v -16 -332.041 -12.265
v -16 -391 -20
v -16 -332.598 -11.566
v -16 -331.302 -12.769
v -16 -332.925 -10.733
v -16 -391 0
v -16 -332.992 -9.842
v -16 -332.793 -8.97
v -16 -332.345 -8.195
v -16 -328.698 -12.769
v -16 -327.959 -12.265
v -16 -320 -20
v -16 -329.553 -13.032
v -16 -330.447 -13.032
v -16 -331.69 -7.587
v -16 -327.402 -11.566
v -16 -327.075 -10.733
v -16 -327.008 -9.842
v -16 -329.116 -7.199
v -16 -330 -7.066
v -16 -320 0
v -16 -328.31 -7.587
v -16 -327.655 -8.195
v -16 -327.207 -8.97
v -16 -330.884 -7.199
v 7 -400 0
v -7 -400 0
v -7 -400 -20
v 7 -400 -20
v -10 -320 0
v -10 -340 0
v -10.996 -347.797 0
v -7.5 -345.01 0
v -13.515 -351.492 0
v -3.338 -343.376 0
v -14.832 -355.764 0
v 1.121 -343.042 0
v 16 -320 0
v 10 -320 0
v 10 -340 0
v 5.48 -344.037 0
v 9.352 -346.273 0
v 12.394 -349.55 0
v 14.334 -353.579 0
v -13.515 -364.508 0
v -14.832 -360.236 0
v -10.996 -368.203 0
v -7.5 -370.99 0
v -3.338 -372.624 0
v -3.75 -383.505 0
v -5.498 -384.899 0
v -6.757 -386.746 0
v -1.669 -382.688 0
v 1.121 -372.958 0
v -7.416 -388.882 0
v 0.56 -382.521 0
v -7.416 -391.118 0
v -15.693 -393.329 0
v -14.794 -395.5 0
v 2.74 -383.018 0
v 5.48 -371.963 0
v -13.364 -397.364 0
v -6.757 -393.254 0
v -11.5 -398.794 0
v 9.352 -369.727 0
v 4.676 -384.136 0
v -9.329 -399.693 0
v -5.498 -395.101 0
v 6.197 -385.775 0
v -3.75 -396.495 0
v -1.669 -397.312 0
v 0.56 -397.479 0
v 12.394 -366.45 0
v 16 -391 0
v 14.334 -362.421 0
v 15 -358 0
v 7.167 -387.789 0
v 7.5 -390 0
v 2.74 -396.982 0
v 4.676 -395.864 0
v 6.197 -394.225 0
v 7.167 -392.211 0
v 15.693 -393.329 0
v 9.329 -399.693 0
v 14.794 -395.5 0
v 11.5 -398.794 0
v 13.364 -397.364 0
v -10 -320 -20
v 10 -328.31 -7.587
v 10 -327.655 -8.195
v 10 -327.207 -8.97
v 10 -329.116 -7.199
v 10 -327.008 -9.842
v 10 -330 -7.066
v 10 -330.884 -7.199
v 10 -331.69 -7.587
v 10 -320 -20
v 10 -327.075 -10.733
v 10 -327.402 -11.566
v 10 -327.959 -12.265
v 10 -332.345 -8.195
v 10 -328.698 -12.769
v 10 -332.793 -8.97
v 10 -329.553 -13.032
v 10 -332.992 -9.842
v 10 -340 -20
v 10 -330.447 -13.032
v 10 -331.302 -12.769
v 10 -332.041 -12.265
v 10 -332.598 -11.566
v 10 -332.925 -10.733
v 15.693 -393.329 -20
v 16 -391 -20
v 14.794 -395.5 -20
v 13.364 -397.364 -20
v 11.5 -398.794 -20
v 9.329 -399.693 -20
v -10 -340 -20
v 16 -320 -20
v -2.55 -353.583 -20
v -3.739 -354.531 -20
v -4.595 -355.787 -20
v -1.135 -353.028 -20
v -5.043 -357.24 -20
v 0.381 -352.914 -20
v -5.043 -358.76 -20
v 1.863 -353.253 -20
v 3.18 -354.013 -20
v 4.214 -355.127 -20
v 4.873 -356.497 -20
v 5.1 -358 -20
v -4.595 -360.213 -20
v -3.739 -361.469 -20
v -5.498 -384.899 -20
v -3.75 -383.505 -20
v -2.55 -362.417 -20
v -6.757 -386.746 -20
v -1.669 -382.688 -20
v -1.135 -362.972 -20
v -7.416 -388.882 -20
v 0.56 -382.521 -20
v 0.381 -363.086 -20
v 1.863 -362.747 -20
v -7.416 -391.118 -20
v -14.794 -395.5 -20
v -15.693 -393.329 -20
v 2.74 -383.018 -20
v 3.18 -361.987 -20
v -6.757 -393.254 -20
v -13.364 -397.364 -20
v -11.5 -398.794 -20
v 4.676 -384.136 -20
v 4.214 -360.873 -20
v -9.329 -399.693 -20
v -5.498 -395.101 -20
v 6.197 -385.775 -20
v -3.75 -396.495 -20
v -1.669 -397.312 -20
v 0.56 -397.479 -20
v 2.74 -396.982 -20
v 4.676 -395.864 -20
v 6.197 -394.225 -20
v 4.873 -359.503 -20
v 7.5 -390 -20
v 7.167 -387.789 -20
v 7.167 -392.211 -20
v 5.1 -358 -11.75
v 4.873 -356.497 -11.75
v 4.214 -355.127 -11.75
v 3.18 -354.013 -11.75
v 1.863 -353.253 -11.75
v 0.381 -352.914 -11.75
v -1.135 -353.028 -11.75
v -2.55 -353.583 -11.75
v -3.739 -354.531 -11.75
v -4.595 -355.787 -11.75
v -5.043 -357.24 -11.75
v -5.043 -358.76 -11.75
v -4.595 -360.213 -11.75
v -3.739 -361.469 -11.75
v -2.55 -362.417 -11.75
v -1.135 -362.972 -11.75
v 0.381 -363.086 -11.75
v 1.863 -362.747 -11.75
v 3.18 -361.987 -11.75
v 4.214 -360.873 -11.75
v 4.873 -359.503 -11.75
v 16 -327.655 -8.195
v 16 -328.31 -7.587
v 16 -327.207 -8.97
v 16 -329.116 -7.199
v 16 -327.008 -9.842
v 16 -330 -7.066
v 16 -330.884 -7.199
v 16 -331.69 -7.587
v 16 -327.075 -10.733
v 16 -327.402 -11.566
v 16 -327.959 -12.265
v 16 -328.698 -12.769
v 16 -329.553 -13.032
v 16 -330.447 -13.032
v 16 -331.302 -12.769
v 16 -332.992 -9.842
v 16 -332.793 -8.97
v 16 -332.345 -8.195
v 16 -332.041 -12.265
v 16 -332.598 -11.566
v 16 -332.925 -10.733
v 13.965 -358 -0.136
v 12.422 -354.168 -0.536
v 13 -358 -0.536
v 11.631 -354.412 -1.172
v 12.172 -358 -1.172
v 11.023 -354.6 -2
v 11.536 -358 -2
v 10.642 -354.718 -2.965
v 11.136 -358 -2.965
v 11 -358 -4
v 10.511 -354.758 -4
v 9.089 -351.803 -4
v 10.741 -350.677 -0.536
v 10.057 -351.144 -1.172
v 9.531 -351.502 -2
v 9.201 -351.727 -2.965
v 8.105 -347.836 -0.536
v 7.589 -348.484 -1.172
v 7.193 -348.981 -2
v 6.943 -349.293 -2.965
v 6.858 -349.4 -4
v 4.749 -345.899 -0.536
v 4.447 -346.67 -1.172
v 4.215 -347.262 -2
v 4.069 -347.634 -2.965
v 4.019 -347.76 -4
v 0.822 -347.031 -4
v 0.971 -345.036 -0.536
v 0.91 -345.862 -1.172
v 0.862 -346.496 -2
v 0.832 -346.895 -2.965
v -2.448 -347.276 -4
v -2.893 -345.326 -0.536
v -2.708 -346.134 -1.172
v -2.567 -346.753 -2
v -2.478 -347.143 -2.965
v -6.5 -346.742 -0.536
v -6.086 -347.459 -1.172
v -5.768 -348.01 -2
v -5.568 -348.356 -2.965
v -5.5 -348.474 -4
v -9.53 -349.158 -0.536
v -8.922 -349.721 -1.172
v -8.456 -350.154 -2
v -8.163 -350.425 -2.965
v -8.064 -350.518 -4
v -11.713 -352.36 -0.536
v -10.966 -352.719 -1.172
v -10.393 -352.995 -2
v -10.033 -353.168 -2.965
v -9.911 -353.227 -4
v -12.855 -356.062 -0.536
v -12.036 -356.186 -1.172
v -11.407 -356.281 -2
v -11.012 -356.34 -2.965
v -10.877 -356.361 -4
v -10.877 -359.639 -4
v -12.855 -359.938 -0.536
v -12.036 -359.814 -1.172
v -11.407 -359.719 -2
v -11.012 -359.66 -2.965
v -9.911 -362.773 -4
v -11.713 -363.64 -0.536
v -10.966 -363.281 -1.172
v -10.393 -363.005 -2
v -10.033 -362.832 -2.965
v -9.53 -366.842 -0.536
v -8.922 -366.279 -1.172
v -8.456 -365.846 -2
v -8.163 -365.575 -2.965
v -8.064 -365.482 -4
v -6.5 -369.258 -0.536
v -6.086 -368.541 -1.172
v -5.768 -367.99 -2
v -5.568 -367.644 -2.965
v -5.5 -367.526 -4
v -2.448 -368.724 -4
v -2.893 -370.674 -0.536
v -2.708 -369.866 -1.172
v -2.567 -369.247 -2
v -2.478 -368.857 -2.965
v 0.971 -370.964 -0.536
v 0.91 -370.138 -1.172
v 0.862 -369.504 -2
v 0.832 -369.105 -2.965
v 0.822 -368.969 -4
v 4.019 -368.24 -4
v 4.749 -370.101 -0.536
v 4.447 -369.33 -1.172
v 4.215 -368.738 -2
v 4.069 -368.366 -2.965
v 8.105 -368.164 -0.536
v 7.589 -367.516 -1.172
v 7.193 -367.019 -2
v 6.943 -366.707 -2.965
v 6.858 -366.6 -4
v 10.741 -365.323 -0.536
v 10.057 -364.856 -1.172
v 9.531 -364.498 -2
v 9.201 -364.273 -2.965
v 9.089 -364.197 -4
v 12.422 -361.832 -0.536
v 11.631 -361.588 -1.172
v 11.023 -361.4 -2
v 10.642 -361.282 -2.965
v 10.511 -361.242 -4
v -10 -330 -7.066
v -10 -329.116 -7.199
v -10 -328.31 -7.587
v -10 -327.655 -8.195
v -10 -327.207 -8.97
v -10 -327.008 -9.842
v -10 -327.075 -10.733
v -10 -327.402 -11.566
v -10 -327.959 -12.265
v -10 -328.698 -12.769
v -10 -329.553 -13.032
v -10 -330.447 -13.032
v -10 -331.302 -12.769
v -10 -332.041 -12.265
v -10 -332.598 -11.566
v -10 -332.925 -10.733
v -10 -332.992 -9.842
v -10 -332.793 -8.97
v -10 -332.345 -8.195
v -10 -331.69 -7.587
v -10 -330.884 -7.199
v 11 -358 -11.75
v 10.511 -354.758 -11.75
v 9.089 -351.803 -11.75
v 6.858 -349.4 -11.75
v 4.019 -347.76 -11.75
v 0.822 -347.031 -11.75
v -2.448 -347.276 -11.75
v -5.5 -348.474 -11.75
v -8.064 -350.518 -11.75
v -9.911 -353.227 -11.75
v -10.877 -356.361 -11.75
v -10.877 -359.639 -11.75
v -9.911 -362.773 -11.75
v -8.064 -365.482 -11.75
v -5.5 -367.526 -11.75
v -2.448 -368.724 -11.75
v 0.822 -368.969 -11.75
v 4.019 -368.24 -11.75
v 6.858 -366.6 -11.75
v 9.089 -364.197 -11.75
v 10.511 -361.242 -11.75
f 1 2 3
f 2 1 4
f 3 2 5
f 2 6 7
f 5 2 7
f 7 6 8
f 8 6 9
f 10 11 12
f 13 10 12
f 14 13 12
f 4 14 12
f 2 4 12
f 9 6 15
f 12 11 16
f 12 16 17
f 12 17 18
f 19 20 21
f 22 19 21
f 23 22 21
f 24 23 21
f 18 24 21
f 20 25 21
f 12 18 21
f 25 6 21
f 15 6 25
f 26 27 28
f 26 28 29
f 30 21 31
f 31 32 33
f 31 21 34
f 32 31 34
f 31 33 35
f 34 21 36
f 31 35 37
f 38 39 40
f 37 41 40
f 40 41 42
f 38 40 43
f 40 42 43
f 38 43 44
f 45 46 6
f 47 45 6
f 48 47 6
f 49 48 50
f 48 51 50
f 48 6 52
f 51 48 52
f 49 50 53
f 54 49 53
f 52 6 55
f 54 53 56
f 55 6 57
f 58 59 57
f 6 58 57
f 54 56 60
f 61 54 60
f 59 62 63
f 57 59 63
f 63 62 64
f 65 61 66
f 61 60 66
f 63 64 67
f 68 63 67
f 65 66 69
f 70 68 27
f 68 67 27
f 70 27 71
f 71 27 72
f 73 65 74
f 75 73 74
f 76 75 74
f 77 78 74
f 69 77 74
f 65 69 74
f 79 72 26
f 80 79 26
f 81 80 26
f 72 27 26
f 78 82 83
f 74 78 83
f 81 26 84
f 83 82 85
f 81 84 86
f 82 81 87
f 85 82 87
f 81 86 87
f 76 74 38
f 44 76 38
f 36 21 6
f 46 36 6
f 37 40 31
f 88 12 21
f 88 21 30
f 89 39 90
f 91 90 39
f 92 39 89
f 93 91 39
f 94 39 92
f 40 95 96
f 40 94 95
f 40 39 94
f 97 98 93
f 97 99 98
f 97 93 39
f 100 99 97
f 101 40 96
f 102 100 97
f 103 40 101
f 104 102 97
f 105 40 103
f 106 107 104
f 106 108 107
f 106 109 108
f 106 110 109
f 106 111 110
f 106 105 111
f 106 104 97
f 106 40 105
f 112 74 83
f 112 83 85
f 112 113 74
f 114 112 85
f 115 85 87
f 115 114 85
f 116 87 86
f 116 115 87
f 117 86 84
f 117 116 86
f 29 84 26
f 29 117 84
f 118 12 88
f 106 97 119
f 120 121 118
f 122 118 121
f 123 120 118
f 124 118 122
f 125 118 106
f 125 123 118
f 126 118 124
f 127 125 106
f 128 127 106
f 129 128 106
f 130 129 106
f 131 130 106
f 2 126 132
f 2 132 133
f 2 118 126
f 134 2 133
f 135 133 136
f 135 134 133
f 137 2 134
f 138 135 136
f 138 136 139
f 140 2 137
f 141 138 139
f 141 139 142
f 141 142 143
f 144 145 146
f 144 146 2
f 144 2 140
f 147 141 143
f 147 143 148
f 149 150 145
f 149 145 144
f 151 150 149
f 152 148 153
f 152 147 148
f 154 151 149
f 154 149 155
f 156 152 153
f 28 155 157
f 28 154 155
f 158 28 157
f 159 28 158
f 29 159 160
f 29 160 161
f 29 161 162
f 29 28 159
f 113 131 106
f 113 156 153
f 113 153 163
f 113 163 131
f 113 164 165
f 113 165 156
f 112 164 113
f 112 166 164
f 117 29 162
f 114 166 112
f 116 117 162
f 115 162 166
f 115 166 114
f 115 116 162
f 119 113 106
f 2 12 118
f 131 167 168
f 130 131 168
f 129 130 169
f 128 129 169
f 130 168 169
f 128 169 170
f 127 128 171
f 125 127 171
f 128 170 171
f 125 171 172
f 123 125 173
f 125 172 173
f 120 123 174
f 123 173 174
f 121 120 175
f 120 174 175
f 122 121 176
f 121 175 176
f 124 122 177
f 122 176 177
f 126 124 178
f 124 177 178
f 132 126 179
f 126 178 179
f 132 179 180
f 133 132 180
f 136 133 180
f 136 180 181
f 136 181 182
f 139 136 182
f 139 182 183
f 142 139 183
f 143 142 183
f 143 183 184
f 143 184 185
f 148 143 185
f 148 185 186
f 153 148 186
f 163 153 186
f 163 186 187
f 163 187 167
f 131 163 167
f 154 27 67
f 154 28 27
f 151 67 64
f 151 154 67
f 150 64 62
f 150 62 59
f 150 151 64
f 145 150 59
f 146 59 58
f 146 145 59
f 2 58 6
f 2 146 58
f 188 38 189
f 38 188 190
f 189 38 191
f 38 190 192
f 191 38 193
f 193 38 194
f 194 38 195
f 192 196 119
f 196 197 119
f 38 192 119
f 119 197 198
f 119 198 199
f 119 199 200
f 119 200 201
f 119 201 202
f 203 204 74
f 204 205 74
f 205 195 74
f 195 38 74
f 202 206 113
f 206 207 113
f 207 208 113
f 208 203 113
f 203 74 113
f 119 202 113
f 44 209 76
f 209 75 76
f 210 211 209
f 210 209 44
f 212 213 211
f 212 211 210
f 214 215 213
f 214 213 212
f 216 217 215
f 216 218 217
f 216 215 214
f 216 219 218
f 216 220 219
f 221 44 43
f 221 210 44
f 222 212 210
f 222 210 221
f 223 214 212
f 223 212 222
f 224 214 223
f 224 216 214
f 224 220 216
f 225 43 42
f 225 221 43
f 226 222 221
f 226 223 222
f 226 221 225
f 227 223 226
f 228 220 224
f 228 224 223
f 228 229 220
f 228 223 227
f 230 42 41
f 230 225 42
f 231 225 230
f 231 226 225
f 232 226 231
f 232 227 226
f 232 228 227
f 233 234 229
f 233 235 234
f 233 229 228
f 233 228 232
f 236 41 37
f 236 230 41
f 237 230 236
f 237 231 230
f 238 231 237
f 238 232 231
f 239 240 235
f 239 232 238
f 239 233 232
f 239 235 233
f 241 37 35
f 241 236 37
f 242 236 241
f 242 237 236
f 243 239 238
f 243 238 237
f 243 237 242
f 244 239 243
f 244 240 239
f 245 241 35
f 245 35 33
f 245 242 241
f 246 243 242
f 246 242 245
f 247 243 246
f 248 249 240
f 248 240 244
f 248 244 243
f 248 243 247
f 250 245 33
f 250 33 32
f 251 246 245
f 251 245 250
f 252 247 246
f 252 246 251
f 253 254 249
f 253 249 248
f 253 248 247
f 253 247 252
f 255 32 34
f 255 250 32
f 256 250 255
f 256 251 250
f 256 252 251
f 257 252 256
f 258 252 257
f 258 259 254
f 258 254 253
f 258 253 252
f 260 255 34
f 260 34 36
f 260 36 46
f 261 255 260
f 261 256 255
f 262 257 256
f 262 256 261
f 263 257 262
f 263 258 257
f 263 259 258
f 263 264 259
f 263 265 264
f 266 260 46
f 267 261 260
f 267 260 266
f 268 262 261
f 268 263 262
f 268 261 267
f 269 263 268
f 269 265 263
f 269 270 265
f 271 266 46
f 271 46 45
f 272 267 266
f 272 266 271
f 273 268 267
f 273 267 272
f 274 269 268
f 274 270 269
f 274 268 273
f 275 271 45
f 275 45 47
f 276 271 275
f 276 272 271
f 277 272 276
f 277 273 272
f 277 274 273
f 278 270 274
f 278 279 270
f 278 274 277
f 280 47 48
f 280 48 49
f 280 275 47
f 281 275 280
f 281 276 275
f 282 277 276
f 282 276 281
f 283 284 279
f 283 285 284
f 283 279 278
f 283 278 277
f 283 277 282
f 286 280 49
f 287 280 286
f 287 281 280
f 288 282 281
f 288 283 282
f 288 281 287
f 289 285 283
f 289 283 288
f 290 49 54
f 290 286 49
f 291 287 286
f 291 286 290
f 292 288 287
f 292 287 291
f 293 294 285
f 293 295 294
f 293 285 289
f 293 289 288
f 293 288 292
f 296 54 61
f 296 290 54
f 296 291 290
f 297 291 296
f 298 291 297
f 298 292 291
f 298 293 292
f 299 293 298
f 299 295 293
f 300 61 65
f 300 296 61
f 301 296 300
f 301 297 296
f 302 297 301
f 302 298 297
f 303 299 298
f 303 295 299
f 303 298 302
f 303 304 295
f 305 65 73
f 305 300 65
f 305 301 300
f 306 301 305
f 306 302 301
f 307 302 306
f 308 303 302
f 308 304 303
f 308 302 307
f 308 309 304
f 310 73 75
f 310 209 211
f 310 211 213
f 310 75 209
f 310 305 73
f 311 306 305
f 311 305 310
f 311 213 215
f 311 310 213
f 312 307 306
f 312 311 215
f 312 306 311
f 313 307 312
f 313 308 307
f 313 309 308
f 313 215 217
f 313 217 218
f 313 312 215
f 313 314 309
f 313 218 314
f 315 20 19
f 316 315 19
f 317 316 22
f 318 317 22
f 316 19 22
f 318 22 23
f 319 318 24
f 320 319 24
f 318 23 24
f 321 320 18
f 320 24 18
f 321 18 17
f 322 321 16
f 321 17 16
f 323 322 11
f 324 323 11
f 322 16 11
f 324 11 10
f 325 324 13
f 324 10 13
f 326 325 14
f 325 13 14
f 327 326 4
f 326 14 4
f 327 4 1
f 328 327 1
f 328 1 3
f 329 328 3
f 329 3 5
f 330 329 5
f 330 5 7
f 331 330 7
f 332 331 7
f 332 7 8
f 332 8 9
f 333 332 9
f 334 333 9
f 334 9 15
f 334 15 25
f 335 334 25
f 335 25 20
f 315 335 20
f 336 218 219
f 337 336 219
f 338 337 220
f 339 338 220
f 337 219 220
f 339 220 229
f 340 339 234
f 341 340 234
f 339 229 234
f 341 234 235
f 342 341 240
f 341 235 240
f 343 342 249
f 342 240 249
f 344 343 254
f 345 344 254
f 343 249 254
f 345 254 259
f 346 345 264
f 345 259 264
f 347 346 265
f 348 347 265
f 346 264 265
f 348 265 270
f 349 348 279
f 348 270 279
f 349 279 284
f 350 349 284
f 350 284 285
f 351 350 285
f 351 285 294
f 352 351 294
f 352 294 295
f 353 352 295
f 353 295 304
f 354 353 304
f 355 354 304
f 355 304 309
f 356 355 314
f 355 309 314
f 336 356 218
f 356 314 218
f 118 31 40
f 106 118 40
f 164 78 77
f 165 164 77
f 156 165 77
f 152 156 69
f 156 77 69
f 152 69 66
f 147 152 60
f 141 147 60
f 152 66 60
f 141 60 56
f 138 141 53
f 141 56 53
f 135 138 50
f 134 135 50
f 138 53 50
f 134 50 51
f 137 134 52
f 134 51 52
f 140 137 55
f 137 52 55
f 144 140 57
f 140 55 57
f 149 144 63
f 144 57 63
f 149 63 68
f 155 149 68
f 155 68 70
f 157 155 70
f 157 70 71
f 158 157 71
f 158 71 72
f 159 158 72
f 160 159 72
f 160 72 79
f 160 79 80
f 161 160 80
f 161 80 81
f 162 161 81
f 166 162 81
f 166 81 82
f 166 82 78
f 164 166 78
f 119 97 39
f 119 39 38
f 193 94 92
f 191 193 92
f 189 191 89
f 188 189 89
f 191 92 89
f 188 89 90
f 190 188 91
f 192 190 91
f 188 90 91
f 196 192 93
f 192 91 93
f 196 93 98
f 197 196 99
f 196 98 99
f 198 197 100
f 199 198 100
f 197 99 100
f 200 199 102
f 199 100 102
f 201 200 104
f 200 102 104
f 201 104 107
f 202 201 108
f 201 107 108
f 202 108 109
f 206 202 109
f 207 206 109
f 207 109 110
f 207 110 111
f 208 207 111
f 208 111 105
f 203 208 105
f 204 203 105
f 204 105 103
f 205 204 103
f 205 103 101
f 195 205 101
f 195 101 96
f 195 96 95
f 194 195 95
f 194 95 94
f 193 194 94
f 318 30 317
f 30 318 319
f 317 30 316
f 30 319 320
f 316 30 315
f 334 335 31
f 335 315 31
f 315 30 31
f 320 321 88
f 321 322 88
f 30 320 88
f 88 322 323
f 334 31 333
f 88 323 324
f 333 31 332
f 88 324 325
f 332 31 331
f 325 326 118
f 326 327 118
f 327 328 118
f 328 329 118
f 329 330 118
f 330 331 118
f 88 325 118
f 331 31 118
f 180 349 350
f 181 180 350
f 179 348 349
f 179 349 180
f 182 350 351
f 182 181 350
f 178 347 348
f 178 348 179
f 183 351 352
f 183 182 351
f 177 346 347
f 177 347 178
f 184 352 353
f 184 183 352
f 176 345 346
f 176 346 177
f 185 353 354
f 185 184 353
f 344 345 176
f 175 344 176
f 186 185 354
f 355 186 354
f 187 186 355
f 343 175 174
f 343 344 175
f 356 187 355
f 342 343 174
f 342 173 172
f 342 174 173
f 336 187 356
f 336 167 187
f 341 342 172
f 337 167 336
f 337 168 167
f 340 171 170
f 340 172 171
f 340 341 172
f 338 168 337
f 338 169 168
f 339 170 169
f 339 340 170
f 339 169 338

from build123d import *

# Parameters (mm, degrees)
SKETCH1_W           = 32
SKETCH1_H           = 60
BOSS_EXTRUDE1_DEPTH = 20
SKETCH2_R           = 7.5
SKETCH2_R_2         = 5.1
CUT_EXTRUDE1_DEPTH  = 401.819161219
SKETCH3_R           = 11
CUT_EXTRUDE2_DEPTH  = 11.75
SKETCH4_W           = 6
SKETCH4_H           = 20
BOSS_EXTRUDE2_DEPTH = 20
SKETCH5_R           = 3
CUT_EXTRUDE3_DEPTH  = 402.776057027
FILLET2_R           = 9
FILLET3_R           = 4


with BuildPart() as part:
    # Sketch1 → Boss-Extrude1 (new body)
    with BuildSketch(Plane.XY):
        with Locations((0, -370)):
            Rectangle(SKETCH1_W, SKETCH1_H)
    extrude(amount=-BOSS_EXTRUDE1_DEPTH)

    # Sketch2 → Cut-Extrude1 (cut, through all)
    with BuildSketch(Plane.XY):
        with Locations((0, -390)):
            Circle(SKETCH2_R)
        with Locations((0, -358)):
            Circle(SKETCH2_R_2)
    extrude(amount=-CUT_EXTRUDE1_DEPTH, mode=Mode.SUBTRACT)

    # Sketch3 → Cut-Extrude2 (cut)
    with BuildSketch(Plane.XY):
        with Locations((0, -358)):
            Circle(SKETCH3_R)
    extrude(amount=-CUT_EXTRUDE2_DEPTH, mode=Mode.SUBTRACT)

    # Sketch4 → Boss-Extrude2 (add)
    with BuildSketch(Plane(origin=(0, -340, 0), x_dir=(1, 0, 0), z_dir=(0, 1, 0))):
        with Locations((13, 10)):
            Rectangle(SKETCH4_W, SKETCH4_H)
        with Locations((-13, 10)):
            Rectangle(SKETCH4_W, SKETCH4_H)
    extrude(amount=BOSS_EXTRUDE2_DEPTH)

    # Sketch5 → Cut-Extrude3 (cut, through all)
    with BuildSketch(Plane.ZY.offset(16)):
        with Locations((-10.065765089, -330)):
            Circle(SKETCH5_R)
    extrude(amount=-CUT_EXTRUDE3_DEPTH, mode=Mode.SUBTRACT)

    # Fillet2
    fillet2_edges = [part.edges().sort_by_distance(p)[0] for p in [
        (16, -400, -10),
        (-16, -400, -10),
    ]]
    fillet(fillet2_edges, radius=FILLET2_R)

    # Fillet3
    fillet3_edges = [part.edges().sort_by_distance(p)[0] for p in [
        (-11, -358, 0),
    ]]
    fillet(fillet3_edges, radius=FILLET3_R)


solid = part.part
